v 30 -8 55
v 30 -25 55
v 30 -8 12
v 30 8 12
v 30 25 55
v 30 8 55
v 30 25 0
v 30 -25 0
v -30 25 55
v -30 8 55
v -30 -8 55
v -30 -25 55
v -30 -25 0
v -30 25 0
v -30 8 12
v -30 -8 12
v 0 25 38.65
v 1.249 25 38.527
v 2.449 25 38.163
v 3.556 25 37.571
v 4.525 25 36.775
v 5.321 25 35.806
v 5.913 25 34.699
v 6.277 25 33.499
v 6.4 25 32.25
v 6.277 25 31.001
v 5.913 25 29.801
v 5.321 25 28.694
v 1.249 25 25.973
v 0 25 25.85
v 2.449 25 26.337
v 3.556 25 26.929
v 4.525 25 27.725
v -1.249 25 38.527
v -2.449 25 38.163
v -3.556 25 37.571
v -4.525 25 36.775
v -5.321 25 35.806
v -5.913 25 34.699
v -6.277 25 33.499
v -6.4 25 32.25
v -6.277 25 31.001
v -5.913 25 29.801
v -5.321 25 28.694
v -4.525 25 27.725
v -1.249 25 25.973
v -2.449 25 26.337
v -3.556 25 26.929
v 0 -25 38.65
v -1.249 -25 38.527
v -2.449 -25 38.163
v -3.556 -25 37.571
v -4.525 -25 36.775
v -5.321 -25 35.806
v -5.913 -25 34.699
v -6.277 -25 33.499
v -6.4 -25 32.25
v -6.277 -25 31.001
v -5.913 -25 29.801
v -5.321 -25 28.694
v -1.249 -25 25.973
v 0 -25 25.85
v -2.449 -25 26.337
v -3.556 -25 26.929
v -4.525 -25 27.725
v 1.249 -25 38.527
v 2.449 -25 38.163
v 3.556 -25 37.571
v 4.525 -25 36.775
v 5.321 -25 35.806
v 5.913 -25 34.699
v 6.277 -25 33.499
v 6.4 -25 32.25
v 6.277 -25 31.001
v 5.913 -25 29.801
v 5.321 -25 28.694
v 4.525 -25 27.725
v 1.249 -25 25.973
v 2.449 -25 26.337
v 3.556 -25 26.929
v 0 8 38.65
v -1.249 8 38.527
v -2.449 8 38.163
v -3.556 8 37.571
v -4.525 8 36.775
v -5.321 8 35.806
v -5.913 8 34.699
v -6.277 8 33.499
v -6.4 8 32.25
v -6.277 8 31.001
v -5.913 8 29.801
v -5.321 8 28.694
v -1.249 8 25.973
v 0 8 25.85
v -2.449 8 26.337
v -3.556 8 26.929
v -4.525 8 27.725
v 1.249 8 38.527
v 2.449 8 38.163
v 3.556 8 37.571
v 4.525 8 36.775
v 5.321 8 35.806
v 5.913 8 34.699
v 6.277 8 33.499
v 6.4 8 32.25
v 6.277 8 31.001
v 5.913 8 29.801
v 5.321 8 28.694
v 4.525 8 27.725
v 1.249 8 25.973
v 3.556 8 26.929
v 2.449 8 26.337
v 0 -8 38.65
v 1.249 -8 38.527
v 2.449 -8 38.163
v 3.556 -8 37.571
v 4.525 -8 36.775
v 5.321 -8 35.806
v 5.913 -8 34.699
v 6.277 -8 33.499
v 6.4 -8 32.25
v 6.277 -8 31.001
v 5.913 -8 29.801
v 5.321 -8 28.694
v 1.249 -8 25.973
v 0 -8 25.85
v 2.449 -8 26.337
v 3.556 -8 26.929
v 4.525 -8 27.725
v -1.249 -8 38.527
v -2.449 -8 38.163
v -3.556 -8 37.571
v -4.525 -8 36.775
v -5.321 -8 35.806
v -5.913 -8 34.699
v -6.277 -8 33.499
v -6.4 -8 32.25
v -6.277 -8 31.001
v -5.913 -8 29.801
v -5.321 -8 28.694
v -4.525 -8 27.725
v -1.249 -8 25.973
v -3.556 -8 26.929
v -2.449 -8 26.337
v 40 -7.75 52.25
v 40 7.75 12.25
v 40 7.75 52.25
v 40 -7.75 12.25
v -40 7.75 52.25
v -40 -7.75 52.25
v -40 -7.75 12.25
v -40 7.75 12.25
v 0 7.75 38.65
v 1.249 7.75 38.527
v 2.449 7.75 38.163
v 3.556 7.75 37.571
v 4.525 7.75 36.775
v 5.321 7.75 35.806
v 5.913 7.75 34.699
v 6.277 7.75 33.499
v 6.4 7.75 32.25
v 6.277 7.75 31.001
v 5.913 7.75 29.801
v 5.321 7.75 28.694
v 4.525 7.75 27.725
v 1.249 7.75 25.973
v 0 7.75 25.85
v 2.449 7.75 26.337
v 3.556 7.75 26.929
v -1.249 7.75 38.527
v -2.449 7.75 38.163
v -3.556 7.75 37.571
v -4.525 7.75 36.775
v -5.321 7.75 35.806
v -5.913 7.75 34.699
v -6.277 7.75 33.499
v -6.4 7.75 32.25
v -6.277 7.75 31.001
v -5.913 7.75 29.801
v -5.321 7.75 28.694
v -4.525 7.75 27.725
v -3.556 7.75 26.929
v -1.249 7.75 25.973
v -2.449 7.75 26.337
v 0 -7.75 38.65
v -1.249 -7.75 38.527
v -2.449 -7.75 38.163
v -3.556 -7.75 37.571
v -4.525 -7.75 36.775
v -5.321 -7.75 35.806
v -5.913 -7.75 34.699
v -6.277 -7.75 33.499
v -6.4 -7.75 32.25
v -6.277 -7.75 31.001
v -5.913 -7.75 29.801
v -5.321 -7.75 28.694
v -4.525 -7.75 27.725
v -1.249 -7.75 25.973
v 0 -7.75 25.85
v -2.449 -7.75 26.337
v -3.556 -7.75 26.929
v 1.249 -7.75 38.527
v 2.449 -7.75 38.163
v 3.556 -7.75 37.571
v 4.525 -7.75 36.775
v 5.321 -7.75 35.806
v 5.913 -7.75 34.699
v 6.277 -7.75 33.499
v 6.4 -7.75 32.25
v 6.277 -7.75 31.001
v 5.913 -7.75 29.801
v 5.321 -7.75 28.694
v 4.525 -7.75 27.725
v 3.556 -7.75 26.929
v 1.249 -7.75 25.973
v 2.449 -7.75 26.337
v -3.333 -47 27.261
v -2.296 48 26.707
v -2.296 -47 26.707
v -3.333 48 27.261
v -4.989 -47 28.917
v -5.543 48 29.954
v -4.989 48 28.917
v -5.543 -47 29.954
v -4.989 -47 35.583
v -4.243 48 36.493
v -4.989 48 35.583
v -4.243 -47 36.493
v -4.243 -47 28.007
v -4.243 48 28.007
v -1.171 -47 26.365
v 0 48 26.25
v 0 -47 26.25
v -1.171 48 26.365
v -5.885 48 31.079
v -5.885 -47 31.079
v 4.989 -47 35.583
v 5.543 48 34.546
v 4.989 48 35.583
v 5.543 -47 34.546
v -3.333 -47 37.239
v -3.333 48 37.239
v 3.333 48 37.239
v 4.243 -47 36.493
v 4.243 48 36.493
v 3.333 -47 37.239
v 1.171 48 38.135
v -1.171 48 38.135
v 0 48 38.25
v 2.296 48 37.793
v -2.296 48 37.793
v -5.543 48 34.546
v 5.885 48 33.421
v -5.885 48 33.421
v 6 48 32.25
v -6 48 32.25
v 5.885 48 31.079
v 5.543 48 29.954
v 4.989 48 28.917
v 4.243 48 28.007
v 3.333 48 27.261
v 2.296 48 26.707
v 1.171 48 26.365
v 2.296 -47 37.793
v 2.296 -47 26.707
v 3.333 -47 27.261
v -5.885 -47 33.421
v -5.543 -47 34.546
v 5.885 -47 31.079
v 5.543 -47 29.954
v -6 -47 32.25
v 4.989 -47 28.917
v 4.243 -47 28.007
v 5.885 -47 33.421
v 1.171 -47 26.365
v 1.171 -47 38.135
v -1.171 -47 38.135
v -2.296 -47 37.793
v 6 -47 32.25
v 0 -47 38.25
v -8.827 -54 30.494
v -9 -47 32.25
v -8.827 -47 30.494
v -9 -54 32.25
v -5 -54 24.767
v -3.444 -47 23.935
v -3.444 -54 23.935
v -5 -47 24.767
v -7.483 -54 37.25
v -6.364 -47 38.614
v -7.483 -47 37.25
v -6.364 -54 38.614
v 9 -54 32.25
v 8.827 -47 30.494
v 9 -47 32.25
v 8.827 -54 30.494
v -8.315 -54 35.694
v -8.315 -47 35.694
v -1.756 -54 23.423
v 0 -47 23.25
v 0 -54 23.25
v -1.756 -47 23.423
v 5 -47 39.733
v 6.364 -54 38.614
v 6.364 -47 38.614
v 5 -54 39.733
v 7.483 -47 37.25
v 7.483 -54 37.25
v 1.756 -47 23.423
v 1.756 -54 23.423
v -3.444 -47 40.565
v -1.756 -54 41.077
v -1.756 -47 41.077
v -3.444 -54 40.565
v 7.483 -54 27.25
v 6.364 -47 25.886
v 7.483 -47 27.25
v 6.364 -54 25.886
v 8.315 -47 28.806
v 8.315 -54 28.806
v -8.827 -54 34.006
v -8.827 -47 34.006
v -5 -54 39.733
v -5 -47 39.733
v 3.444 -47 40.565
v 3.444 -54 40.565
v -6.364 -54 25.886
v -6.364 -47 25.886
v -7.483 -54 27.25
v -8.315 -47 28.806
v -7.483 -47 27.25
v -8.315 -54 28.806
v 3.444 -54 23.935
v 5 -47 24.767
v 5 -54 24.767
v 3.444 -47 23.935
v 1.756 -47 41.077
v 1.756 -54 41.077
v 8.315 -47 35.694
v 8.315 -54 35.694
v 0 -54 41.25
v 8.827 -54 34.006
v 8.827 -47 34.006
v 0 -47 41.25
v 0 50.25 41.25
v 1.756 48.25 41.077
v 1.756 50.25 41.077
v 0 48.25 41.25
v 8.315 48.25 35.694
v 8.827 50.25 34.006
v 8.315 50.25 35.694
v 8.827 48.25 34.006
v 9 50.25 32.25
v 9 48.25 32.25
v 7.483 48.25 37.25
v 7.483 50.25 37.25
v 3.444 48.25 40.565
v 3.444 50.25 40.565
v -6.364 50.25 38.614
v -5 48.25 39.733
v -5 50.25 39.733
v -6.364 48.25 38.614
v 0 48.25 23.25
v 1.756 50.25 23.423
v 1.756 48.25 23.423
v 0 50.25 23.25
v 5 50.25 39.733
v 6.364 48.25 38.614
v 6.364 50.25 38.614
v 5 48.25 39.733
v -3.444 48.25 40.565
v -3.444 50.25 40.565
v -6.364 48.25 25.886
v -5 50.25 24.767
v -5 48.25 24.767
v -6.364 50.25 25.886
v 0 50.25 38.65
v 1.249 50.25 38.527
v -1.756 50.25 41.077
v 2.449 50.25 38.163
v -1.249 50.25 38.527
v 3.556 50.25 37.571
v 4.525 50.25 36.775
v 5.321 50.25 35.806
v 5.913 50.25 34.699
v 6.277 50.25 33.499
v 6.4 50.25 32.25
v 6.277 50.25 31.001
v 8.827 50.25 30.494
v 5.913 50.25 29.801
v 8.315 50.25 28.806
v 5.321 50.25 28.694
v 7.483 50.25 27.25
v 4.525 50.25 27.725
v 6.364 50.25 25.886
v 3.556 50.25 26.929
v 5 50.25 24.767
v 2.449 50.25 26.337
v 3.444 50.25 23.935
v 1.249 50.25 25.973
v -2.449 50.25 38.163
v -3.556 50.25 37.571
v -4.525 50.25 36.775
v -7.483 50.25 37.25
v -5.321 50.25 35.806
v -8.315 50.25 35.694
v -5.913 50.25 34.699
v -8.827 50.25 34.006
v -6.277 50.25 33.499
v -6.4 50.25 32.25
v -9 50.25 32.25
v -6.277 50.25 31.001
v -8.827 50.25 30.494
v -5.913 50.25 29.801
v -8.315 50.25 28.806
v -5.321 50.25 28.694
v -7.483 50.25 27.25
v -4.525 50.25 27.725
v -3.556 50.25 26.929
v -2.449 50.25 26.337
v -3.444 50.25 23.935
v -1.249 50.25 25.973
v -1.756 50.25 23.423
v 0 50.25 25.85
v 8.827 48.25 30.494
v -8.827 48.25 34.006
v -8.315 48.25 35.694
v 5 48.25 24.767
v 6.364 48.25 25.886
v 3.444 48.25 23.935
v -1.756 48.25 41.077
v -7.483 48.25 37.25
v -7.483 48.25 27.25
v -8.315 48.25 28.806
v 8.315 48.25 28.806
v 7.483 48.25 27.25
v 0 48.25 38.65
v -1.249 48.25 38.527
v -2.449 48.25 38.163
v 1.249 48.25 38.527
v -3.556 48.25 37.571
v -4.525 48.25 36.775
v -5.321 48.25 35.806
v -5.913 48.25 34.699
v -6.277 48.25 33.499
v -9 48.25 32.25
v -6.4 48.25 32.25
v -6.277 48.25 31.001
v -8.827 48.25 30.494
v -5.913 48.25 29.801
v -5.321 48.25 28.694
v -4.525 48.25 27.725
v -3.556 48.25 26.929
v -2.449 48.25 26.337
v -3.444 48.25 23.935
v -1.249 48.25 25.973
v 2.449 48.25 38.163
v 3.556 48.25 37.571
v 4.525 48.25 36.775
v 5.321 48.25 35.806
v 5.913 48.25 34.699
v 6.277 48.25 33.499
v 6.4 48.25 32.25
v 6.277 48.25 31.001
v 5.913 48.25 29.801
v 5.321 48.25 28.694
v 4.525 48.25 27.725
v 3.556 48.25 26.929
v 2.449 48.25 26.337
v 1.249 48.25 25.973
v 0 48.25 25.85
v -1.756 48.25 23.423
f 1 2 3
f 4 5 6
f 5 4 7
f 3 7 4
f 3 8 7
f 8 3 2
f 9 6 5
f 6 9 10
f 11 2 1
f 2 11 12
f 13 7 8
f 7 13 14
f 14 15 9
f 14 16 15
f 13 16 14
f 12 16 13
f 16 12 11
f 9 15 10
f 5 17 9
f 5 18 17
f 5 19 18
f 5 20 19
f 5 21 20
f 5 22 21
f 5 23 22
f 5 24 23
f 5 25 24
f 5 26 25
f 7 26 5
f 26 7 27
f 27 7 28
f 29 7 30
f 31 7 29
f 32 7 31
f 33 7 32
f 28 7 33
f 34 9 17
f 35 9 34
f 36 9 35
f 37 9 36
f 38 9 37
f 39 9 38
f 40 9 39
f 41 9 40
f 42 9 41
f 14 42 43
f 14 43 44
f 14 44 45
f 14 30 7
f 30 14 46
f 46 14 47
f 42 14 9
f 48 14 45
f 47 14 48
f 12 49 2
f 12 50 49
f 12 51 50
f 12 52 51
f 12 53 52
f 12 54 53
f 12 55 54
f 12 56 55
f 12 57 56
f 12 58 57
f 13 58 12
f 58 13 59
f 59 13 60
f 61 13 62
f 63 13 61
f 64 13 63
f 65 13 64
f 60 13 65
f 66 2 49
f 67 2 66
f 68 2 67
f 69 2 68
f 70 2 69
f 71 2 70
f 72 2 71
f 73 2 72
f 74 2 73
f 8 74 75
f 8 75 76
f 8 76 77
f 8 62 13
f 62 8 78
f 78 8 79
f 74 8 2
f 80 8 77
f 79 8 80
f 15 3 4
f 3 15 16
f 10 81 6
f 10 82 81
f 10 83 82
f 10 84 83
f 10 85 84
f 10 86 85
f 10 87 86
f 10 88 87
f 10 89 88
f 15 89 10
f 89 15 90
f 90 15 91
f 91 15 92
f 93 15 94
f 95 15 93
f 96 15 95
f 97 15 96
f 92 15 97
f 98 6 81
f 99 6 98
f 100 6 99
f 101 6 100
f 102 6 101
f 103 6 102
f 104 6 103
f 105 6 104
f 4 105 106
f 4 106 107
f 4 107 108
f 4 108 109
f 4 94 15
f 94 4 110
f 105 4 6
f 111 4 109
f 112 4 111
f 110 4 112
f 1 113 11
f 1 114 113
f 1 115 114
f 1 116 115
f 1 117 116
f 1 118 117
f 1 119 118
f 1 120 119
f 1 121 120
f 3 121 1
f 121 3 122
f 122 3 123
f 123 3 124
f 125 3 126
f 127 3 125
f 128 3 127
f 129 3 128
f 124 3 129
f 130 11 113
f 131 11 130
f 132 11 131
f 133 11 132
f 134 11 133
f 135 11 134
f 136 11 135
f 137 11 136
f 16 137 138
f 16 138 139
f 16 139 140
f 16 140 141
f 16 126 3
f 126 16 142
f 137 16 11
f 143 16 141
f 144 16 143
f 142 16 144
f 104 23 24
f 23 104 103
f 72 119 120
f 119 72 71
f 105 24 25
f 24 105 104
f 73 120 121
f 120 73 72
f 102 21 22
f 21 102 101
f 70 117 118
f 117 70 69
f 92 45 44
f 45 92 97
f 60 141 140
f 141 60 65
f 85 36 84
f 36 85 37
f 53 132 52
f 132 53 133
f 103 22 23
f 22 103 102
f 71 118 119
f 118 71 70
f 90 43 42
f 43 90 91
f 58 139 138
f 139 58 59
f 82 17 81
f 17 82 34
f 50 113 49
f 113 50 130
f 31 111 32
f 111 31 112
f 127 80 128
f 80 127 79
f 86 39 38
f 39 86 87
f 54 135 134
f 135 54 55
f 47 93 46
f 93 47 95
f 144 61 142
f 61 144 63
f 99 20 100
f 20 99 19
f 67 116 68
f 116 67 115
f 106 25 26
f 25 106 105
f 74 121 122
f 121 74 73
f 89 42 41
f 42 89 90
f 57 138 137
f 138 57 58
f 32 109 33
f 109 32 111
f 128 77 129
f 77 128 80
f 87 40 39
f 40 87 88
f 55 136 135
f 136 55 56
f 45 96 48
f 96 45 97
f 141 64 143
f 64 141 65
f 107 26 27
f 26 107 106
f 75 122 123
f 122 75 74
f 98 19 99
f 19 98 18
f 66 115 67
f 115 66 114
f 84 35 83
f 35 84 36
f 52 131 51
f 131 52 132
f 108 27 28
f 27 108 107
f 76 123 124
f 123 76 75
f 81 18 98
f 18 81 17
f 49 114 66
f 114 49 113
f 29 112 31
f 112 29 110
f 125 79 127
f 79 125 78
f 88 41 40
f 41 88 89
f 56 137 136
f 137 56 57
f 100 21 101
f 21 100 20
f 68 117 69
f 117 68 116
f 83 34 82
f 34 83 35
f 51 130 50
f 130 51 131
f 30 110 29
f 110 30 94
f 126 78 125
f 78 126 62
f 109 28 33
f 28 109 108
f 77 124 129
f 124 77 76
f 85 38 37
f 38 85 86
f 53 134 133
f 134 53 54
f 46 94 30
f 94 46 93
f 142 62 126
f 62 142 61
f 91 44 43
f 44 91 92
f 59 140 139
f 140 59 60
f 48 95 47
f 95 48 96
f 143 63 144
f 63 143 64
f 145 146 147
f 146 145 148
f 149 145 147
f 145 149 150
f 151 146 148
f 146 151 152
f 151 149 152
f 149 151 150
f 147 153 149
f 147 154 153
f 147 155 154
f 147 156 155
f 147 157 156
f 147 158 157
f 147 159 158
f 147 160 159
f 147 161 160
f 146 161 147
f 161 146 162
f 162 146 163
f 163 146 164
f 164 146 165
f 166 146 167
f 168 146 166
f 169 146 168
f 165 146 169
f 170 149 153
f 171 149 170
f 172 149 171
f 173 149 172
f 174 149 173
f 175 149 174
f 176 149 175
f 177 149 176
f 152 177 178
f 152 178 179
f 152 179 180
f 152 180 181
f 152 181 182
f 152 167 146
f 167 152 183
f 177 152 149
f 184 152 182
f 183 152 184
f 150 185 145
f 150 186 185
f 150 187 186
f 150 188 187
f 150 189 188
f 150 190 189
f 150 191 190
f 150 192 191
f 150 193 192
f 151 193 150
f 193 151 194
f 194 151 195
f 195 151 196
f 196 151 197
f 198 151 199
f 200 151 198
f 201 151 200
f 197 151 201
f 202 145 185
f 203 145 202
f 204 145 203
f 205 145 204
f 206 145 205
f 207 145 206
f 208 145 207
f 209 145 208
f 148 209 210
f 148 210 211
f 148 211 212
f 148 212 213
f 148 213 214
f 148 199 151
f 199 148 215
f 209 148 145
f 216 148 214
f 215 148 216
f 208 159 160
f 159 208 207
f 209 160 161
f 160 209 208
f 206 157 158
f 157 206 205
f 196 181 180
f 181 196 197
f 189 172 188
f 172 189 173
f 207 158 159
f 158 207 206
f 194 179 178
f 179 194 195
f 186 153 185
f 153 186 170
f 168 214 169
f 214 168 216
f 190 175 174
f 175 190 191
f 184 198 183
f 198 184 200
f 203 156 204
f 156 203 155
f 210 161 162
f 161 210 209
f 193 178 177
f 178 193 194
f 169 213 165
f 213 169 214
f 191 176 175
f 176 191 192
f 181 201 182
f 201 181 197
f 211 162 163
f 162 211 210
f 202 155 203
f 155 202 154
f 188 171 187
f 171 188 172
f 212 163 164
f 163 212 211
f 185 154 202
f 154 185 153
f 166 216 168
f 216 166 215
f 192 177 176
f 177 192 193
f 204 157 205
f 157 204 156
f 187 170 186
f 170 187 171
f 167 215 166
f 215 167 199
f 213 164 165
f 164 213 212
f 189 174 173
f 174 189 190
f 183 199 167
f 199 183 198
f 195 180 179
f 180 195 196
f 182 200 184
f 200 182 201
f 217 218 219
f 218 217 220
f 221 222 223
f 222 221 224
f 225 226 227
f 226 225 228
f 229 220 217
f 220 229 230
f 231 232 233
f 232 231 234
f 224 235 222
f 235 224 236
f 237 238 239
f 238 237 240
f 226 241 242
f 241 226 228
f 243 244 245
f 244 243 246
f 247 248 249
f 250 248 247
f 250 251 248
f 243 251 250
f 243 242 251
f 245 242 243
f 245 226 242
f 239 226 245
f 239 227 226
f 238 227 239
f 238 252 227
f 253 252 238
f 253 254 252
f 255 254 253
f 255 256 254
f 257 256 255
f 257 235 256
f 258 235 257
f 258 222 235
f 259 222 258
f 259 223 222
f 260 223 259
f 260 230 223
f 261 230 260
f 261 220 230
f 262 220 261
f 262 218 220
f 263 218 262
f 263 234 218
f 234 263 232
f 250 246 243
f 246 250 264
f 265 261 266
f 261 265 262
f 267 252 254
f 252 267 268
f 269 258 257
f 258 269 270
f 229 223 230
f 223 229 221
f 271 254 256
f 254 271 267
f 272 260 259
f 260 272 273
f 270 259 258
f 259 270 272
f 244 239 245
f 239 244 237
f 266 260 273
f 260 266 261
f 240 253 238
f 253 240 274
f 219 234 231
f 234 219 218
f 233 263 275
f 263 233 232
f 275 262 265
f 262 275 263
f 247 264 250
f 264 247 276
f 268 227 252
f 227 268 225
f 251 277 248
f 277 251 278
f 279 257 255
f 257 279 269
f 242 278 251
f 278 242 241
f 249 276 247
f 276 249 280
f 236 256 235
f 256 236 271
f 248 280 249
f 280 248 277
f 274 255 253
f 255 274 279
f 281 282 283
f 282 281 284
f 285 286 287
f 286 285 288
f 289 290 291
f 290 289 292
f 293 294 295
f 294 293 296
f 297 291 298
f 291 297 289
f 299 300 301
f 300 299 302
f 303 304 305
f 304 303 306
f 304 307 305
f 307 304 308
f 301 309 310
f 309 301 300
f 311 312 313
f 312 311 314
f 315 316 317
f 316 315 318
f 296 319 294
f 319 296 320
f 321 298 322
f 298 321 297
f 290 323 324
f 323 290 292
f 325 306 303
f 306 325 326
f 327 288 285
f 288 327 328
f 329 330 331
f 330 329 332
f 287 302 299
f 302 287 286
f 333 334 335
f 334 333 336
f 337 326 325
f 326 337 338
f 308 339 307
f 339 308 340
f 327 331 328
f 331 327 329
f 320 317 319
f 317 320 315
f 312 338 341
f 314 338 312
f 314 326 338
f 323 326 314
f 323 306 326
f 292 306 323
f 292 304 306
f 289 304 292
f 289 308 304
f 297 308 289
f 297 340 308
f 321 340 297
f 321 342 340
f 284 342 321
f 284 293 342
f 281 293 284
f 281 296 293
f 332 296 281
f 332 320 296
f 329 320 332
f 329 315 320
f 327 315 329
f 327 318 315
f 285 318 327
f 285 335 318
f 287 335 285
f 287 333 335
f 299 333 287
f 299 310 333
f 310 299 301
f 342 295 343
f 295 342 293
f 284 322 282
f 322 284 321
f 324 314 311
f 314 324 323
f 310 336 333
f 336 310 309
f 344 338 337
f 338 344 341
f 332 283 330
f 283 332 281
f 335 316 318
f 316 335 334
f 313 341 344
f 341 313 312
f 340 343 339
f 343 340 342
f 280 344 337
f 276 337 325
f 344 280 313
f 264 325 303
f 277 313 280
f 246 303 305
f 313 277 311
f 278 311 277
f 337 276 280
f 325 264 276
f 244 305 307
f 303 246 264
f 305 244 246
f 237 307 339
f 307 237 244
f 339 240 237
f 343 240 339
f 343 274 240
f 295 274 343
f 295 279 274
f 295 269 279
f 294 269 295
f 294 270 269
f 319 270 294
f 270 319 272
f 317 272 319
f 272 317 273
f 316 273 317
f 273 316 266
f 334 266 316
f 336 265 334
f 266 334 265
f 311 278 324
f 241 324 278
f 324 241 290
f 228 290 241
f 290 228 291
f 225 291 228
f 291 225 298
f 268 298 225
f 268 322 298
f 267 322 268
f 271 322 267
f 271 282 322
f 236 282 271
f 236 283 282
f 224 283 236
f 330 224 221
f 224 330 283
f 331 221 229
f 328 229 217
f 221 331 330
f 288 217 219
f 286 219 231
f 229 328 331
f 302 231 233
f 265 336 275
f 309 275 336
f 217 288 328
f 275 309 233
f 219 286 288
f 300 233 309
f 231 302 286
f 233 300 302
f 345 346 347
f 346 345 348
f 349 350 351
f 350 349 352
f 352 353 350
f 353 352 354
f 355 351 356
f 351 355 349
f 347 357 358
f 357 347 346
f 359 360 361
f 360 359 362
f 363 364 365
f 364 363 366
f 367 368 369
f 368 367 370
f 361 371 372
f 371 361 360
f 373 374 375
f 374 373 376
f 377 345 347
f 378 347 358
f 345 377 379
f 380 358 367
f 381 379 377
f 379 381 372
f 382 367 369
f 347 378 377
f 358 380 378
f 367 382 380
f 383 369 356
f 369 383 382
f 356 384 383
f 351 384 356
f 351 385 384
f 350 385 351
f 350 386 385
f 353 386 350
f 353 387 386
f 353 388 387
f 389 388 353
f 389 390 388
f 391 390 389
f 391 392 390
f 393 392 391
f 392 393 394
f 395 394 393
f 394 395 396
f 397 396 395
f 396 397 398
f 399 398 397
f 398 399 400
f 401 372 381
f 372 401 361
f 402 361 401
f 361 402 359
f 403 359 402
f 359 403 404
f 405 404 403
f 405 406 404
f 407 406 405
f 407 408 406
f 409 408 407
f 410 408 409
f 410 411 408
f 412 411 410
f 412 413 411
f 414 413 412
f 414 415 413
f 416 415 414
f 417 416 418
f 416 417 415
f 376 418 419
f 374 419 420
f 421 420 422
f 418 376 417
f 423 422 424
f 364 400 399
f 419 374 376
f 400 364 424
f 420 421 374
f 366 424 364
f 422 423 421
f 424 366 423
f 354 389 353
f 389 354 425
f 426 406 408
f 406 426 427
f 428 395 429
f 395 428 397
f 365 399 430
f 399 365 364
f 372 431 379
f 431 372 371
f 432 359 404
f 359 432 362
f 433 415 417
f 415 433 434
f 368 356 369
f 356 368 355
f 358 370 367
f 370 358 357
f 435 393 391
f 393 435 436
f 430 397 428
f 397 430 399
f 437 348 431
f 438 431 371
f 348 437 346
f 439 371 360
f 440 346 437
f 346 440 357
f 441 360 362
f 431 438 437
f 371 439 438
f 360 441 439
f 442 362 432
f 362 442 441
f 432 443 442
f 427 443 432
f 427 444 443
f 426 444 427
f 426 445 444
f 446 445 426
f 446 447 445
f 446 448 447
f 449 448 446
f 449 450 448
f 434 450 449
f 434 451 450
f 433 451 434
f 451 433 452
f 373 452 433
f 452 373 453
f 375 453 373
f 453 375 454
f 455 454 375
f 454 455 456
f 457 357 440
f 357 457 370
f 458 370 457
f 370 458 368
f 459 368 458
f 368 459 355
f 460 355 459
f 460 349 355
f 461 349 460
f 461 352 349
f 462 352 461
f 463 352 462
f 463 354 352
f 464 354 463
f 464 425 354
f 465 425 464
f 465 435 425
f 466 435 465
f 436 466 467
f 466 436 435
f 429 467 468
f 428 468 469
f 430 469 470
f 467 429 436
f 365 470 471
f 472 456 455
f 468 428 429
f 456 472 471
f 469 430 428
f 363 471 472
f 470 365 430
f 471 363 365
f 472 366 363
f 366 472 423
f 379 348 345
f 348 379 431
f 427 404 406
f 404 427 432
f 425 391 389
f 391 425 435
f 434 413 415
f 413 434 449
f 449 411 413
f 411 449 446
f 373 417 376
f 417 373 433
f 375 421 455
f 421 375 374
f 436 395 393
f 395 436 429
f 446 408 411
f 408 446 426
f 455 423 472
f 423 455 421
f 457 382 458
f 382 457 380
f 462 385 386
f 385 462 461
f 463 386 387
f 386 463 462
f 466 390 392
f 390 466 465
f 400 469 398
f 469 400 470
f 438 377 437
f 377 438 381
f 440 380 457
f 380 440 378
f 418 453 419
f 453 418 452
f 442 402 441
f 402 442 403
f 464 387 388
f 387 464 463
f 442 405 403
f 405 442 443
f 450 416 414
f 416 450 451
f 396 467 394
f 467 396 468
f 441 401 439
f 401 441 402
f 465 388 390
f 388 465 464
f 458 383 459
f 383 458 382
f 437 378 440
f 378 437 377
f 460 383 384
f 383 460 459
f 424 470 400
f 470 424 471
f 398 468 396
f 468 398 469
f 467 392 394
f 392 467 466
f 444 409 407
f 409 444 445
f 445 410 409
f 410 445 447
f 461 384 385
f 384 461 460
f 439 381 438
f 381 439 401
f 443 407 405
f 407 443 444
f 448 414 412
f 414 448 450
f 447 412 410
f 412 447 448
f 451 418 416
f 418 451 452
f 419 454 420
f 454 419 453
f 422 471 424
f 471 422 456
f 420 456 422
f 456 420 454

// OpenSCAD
$fn = 32;

// ------------------------------------------------------------------------
// Clevis joint: 60 mm clevis, pin d12
// Every part is its own module, assembly() places them once.
// ------------------------------------------------------------------------

// --- part 1 ---
module clevis() {
  difference() {
    translate([-30, -25, 0]) cube([60, 50, 55]);
    translate([-31, -8, 12]) cube([62, 16, 44]);
    translate([0, 0, 32.25]) rotate([90, 0, 0]) cylinder(h = 52, d = 12.8, center = true);
  }
}

// --- part 2 ---
module eye() {
  difference() {
    translate([-40, -7.75, 0]) cube([80, 15.5, 40]);
    translate([0, 0, 20]) rotate([90, 0, 0]) cylinder(h = 17.5, d = 12.8, center = true);
  }
}

// --- part 3 ---
module pin() {
  rotate([0, 90, 0]) cylinder(h = 96, d = 12, center = true);
  translate([-54, 0, 0]) rotate([0, 90, 0]) cylinder(h = 7, d = 18);
}

// --- part 4 ---
module retainer() {
  difference() {
      translate([0, 0, 0]) cylinder(h = 2, d = 18);
      translate([0, 0, -1]) cylinder(h = 4, d = 12.8);
    }
}

// --- assembly ---
module assembly() {
  translate([0, 0, 0]) rotate([0, 0, 0]) clevis();
  translate([0, 0, 12.25]) rotate([0, 0, 0]) eye();
  translate([0, 0, 32.25]) rotate([0, 0, 90]) pin();
  translate([0, 50.25, 32.25]) rotate([90, 0, 0]) retainer();
}

assembly();
